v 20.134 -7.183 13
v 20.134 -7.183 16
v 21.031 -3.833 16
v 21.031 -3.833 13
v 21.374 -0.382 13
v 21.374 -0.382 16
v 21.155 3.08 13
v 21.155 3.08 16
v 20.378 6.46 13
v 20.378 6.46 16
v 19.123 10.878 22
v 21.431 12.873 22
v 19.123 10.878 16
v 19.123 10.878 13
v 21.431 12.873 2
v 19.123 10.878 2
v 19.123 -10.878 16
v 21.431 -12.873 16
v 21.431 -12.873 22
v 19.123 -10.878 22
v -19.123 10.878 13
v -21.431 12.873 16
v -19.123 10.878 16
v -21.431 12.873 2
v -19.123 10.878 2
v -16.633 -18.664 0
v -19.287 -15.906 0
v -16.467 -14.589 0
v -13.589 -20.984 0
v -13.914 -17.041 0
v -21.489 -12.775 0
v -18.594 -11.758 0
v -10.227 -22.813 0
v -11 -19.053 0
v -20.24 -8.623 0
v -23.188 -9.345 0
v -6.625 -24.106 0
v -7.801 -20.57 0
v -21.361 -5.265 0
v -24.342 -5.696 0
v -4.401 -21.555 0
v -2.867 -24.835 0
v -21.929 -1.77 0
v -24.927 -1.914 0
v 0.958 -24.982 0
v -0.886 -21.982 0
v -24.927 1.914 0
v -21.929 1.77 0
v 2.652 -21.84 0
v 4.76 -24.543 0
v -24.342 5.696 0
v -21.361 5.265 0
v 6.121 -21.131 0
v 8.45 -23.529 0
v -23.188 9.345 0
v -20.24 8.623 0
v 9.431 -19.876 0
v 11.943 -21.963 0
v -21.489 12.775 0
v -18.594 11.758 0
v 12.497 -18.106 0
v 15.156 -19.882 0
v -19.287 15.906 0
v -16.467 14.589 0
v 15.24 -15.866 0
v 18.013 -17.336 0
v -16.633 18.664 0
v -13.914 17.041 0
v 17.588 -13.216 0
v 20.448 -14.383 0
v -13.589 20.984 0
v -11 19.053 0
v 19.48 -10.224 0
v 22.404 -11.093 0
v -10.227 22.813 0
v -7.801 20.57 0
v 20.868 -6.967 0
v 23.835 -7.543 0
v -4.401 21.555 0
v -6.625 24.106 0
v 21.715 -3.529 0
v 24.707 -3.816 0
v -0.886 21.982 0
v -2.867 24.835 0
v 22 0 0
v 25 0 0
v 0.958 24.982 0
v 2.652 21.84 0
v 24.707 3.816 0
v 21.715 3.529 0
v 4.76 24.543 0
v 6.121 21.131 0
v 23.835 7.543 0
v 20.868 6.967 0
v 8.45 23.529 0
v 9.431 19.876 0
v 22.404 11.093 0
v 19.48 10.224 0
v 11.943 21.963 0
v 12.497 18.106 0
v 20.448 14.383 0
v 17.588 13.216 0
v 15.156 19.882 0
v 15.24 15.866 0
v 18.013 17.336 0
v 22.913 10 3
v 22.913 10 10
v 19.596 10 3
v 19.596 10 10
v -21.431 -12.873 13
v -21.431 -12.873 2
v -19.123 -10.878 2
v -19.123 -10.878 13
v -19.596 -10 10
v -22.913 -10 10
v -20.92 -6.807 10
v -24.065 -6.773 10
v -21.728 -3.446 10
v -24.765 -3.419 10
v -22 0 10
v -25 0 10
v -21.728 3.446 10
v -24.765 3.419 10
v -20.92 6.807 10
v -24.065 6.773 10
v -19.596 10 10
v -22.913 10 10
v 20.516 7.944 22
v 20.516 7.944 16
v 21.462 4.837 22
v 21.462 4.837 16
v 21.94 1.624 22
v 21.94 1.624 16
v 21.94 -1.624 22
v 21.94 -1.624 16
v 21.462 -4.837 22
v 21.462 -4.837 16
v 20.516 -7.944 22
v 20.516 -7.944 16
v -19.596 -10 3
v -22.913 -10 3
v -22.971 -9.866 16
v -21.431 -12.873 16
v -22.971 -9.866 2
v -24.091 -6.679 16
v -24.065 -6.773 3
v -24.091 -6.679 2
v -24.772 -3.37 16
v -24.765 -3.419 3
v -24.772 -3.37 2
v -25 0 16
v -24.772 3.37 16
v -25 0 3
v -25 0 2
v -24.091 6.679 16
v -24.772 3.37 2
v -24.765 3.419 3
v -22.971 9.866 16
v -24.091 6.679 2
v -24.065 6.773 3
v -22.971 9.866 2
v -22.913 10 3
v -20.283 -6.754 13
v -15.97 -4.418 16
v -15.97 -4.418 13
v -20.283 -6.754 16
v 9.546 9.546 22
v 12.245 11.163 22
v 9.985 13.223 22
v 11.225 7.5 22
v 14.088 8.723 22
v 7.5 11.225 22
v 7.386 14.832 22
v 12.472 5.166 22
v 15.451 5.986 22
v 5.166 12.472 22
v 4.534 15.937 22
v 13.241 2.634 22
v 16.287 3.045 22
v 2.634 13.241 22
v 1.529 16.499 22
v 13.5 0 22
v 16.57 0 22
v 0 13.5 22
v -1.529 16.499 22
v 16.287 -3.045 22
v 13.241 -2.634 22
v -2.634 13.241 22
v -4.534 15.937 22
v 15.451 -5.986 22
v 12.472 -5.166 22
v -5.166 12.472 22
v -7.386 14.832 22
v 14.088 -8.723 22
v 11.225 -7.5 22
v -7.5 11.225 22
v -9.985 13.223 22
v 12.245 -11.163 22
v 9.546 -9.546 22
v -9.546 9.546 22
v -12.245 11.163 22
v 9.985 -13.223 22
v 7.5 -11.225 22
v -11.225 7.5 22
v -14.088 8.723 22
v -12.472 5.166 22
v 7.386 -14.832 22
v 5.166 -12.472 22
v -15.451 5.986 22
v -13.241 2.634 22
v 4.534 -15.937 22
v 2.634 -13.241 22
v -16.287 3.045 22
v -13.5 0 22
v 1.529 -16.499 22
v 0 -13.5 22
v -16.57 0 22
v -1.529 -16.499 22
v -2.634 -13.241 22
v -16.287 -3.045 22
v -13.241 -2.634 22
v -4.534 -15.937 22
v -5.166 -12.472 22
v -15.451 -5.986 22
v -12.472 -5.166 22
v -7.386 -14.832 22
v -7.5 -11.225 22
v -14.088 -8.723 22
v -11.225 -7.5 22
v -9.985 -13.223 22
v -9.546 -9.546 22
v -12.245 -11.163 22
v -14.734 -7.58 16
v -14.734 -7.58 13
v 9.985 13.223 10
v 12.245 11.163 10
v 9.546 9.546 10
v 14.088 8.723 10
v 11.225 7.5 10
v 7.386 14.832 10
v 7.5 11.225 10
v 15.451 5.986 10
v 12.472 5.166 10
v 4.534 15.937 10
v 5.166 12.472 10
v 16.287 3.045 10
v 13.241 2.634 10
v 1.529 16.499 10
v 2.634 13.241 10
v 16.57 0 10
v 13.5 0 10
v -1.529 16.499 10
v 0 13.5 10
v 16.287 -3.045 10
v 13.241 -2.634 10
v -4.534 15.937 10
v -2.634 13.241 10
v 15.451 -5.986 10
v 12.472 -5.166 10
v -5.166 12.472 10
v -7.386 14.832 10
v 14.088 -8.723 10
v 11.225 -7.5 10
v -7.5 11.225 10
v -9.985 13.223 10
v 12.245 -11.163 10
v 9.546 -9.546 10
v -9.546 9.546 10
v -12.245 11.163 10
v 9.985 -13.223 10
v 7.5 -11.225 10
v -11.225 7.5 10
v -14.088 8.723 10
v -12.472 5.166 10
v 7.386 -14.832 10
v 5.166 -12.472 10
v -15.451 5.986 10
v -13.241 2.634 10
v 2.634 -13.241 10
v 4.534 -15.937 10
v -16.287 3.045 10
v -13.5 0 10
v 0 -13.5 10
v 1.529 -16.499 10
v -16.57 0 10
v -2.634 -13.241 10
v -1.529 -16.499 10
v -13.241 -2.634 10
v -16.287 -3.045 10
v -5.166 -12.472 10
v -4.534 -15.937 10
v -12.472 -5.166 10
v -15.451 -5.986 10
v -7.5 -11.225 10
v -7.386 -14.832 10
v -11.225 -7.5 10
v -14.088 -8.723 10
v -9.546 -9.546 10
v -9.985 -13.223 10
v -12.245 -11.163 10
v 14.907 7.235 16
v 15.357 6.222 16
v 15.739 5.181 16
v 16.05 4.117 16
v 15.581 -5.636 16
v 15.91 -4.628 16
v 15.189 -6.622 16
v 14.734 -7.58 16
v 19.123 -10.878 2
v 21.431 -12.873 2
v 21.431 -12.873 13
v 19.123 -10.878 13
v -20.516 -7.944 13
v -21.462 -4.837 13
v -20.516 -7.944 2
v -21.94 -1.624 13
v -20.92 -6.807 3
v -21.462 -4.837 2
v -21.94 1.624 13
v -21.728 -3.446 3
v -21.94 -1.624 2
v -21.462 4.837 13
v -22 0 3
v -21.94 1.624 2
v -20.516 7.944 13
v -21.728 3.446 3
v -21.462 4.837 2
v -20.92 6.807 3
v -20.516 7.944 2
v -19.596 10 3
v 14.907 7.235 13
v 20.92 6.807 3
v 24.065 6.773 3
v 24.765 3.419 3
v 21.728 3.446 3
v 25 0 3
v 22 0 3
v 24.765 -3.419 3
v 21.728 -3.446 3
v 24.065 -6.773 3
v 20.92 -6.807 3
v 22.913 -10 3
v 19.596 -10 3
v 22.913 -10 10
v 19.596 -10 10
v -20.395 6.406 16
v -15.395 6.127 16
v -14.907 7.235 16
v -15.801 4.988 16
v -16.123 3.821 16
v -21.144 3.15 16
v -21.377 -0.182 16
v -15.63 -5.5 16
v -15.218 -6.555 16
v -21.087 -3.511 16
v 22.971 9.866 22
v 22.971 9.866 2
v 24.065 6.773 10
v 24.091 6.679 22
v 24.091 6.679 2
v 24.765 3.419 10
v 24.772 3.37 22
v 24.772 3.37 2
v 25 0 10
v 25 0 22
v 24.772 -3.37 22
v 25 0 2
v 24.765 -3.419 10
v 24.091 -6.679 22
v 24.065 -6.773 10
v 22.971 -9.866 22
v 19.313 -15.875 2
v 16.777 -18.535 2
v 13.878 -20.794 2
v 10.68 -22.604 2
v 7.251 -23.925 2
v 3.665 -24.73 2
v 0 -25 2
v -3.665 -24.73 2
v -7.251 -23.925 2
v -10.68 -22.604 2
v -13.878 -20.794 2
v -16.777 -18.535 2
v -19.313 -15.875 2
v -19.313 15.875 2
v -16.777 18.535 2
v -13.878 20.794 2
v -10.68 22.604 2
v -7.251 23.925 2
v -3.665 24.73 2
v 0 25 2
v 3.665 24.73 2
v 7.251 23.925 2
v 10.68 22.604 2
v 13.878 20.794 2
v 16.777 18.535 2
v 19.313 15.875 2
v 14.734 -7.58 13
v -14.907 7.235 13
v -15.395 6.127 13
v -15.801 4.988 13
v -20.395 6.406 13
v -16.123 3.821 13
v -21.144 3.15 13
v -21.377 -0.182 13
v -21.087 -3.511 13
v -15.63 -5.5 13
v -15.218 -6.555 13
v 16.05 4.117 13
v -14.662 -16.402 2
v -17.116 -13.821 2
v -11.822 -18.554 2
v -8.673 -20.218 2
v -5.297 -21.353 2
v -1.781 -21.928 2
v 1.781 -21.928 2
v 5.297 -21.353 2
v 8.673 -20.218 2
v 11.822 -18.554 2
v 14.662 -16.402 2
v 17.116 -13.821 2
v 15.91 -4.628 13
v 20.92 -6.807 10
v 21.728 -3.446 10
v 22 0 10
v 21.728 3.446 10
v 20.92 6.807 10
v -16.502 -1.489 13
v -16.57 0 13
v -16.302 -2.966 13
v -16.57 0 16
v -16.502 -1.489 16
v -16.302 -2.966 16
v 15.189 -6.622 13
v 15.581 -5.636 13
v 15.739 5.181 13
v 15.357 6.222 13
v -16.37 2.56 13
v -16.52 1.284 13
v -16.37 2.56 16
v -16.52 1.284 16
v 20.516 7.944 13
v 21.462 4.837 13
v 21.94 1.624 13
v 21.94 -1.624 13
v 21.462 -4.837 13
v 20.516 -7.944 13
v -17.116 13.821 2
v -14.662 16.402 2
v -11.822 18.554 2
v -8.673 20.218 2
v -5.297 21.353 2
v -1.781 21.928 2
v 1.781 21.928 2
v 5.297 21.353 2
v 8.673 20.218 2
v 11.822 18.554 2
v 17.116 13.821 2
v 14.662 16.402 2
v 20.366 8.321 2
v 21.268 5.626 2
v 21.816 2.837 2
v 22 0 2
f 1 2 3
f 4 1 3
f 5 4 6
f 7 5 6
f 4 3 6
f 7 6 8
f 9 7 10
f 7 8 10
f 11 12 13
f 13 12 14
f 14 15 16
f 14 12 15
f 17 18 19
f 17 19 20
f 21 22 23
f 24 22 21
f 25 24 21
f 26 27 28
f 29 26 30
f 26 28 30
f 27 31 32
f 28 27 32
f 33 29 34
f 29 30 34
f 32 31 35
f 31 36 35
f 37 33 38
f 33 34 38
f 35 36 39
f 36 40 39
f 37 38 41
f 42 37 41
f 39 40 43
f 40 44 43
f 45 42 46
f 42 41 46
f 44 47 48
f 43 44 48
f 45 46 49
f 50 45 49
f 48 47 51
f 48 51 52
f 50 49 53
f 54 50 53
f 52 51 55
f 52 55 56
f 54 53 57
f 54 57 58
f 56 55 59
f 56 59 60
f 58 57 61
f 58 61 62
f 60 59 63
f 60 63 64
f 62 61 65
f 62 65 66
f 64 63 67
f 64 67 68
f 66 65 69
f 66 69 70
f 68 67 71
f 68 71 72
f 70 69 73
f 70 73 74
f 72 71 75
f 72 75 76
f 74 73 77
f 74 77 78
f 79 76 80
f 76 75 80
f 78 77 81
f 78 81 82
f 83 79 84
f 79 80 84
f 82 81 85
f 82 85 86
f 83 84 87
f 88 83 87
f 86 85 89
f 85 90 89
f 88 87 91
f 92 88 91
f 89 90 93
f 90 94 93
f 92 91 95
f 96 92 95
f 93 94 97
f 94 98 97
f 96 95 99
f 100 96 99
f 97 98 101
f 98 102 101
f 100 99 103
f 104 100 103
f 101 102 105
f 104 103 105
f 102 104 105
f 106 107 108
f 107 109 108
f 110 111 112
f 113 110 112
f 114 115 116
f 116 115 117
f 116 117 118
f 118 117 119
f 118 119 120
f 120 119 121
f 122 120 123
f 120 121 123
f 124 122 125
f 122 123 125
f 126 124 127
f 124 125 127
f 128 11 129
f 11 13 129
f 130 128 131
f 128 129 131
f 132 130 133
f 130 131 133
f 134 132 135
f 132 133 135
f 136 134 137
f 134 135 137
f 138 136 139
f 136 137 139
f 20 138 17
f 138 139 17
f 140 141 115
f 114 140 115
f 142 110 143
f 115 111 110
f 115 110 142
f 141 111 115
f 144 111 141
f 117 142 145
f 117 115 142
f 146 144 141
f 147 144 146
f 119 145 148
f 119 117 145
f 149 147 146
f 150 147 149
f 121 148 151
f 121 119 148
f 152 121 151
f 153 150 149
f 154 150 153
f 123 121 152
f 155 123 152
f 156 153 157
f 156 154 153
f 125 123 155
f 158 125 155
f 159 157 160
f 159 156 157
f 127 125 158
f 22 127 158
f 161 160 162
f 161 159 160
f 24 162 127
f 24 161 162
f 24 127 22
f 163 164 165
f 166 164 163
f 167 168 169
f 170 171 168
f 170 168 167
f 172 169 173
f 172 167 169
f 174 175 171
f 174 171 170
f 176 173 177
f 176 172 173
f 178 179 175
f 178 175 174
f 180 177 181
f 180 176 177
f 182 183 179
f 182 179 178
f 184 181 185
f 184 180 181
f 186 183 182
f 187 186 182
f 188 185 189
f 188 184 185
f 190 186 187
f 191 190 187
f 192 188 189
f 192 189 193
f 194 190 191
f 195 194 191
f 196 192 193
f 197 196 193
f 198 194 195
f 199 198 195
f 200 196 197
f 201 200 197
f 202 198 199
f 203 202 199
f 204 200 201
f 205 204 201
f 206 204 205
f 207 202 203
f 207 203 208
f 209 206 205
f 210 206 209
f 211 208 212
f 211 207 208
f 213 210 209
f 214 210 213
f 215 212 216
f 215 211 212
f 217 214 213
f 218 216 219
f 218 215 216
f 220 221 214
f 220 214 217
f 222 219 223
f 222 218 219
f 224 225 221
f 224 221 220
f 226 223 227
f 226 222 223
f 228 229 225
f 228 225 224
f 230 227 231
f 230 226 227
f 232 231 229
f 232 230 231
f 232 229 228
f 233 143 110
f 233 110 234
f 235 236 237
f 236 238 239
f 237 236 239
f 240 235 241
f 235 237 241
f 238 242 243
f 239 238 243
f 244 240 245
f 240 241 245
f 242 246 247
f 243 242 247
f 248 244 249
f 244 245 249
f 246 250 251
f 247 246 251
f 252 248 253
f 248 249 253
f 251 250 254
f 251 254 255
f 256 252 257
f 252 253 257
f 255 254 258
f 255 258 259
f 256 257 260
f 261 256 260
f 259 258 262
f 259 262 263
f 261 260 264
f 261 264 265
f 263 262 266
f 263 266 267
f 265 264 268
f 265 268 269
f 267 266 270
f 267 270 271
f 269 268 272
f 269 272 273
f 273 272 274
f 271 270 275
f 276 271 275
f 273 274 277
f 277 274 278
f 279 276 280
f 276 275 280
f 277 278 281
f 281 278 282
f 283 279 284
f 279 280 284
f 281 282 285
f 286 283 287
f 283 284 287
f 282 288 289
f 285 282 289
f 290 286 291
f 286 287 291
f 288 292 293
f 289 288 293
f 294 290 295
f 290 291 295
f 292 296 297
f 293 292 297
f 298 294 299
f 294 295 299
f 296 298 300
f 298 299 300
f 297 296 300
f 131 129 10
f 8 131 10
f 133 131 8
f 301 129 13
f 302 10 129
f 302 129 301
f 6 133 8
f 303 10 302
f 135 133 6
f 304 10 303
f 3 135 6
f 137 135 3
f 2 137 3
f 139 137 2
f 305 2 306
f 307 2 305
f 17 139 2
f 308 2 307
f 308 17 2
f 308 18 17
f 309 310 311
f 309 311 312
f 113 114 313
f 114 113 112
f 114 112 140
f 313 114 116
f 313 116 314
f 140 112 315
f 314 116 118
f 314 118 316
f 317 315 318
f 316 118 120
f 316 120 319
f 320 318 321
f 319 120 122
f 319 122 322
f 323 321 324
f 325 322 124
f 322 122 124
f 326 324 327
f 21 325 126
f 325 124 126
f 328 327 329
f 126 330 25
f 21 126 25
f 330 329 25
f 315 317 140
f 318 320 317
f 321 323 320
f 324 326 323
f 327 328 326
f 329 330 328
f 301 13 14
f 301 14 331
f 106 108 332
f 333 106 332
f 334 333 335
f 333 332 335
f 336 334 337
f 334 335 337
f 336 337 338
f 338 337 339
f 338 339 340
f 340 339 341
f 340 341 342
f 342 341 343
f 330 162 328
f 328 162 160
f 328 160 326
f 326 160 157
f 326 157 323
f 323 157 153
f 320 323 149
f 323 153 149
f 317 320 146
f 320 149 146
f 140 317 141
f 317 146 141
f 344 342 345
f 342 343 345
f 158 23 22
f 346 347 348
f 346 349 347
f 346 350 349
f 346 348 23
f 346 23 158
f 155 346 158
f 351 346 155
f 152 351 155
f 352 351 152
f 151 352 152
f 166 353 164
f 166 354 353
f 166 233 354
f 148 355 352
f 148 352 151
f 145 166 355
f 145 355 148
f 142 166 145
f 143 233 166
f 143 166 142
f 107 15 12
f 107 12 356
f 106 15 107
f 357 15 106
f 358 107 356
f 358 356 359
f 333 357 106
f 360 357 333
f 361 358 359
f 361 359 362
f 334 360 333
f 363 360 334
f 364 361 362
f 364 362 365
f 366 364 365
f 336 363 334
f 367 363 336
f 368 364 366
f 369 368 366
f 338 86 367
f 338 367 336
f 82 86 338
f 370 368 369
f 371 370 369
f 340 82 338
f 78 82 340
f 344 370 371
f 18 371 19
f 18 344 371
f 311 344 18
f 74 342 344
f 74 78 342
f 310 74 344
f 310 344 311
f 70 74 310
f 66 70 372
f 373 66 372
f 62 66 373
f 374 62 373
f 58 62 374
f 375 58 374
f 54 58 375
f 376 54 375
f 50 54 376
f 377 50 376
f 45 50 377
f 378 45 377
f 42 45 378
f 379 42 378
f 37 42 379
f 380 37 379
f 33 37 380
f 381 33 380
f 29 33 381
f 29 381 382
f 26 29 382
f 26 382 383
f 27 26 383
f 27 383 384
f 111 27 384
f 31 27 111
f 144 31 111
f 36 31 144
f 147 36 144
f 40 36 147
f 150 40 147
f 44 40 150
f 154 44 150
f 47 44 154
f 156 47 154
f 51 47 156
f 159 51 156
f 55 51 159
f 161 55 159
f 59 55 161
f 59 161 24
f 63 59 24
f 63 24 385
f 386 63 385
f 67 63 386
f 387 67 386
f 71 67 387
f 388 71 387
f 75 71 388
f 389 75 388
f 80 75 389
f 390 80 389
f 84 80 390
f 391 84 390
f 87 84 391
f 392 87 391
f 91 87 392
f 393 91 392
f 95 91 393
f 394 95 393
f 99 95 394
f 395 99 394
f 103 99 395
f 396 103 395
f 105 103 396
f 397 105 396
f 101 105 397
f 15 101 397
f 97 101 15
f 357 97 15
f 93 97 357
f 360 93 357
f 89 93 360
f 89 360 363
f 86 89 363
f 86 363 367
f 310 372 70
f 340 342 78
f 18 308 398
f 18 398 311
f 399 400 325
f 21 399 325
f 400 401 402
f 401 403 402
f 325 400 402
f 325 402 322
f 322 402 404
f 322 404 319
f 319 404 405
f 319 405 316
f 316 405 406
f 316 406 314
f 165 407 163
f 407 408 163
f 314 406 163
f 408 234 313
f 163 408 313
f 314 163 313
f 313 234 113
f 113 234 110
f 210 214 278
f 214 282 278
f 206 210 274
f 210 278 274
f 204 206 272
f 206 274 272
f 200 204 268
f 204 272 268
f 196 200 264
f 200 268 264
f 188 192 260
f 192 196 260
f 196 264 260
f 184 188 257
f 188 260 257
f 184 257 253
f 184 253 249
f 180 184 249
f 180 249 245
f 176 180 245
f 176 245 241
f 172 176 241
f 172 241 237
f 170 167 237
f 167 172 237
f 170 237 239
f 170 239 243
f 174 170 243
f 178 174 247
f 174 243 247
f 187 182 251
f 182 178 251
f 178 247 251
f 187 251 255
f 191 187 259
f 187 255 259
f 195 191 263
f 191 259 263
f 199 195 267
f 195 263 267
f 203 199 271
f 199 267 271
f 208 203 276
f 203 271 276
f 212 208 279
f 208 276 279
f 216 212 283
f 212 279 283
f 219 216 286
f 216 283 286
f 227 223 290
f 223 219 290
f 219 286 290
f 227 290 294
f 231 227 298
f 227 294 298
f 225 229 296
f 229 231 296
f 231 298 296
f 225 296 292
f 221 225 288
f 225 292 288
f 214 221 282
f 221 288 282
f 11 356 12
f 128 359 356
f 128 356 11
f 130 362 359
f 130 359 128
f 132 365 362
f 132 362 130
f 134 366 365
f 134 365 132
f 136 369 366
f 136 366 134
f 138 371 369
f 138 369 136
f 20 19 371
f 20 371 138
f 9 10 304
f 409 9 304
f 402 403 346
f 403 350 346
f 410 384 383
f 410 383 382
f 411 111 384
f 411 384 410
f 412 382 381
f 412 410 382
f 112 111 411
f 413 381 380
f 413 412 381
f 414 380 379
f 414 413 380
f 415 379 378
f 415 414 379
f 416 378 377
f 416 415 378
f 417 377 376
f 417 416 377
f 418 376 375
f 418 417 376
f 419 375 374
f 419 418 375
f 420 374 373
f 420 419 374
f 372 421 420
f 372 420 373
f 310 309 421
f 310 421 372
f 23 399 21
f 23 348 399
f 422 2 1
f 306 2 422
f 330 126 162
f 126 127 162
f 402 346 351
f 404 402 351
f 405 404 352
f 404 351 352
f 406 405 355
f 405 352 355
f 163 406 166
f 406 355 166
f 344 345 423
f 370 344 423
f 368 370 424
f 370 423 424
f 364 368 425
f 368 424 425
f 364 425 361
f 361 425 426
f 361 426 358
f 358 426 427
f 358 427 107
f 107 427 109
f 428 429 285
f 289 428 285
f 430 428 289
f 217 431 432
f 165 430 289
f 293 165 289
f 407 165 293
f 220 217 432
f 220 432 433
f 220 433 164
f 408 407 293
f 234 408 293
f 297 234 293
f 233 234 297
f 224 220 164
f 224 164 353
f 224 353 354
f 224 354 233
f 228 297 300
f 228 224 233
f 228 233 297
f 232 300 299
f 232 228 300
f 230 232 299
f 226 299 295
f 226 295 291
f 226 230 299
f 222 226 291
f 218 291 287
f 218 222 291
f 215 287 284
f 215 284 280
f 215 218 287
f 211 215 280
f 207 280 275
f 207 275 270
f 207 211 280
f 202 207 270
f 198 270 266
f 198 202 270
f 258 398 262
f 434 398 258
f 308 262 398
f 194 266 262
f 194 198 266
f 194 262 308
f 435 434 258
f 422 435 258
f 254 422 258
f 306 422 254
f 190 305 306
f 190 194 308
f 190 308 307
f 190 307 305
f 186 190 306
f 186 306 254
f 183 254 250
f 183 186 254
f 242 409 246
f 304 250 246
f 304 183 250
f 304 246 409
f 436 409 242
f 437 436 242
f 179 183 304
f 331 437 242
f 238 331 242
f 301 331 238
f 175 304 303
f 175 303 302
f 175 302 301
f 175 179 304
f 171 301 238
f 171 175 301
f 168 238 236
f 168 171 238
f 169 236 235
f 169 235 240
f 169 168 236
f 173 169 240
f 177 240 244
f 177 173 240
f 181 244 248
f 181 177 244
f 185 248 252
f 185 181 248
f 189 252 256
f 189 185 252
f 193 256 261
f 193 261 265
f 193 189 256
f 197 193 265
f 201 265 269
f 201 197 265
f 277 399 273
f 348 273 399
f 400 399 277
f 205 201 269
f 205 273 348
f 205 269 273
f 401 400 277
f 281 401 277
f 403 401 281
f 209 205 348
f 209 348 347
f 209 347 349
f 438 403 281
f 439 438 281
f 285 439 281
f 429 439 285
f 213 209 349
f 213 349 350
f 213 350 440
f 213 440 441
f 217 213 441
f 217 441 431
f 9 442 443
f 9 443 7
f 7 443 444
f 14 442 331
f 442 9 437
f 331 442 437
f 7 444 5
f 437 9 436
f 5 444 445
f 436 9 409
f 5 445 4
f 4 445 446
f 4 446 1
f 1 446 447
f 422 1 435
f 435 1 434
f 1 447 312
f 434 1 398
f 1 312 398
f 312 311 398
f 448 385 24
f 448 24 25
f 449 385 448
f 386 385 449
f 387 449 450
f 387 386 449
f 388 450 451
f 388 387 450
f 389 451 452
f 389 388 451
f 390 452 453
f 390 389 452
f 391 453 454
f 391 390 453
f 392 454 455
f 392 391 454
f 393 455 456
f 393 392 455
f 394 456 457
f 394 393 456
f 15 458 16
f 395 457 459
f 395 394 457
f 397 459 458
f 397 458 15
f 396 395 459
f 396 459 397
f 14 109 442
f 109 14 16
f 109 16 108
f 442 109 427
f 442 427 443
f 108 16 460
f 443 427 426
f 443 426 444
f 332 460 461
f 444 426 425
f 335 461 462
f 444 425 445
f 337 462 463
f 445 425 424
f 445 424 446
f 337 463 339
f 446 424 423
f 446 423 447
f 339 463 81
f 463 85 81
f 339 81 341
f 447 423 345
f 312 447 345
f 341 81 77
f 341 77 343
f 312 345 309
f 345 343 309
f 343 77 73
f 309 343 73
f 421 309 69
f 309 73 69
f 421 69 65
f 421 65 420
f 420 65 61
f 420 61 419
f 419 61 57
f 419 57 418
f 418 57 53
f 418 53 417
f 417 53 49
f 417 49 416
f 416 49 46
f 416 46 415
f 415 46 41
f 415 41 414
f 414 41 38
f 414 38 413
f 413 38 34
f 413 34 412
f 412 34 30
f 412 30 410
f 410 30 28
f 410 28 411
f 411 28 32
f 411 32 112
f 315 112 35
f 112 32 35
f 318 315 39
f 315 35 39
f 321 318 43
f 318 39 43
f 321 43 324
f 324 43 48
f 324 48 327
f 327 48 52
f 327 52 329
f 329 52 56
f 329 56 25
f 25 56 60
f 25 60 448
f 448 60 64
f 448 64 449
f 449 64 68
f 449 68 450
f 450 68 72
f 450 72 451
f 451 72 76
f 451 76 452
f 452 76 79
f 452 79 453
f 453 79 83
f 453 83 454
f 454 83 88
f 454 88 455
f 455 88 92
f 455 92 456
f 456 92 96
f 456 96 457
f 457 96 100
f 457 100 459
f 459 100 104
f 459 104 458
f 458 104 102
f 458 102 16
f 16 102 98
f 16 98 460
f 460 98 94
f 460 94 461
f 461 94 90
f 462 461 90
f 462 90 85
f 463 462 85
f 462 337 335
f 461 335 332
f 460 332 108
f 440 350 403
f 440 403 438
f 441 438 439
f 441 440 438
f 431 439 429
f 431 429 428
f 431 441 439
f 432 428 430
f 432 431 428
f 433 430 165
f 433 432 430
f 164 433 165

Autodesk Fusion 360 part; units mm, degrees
sketch "Sketch1" plane through (0, 0, 0) normal (0, 0, 1) x (1, 0, 0)
  circle A0 centre (0, 0) radius 22
  circle A1 centre (0, 0) radius 25
  dimension "d1" = 44
  dimension "d2" = 50
extrude "Extrude1" add sketch "Sketch1" along normal blind 2 makes body 1
sketch "Sketch2" plane through (0, 0, 2) normal (0, 0, 1) x (-1, 0, 0)
  circle A0 centre (0, 0) radius 22
  circle A1 centre (0, 0) radius 25
  circle A2 centre (0, 0) radius 22
  circle A3 centre (0, 0) radius 25
  line L0 (21.4312, -12.8726) -> (19.1226, -10.8777)
  line L1 (21.4312, 12.8726) -> (19.1226, 10.8777)
  line L2 (-21.4312, -12.8726) -> (-19.1226, -10.8777)
  line L3 (-21.4312, 12.8726) -> (-19.1226, 10.8777)
extrude "Extrude2" add sketch "Sketch2" along normal blind 15 contours A0 A1 A2 A3 L0 L1 | A0 A1 A2 A3 L2 L3 bodies 1
sketch "Sketch3" plane through (0, 0, 17) normal (0, 0, 1) x (-1, 0, 0)
  arc A0 (21.4312, -12.8726) -> (21.4312, 12.8726) centre (0, 0) ccw
  line L0 (21.4312, 12.8726) -> (19.1226, 10.8777)
  arc A1 (19.1226, -10.8777) -> (19.1226, 10.8777) centre (0, 0) ccw
  line L1 (19.1226, -10.8777) -> (21.4312, -12.8726)
  circle A2 centre (0, 0) radius 13.5
  circle A3 centre (0, 0) radius 16.5695
  dimension "d7" = 27
extrude "Extrude3" add sketch "Sketch3" along normal blind 5 separate body contours A3 makes body 2
extrude "Extrude4" add 2 faces at (-23.9039, -1.6648, 17) (23.9039, 1.6648, 17) along direction (0, 0, 1) blind 5 on bodies 1 bodies 1
extrude "Extrude5" add 1 faces at (-15.4344, 1.4939, 17) along direction (0, 0, -1) blind 7 on bodies 2 bodies 2
extrude "Extrude6" cut 2 faces at (-23.9039, -1.6648, 22) (-23.9039, -1.6648, 22) along direction (0, 0, -1) blind 6 on bodies 1 bodies 1
sketch "Sketch4" plane through (0, 0, 16) normal (0, 0, 1) x (-1, 0, 0)
  arc A0 (21.4312, -12.8726) -> (21.4312, 12.8726) centre (0, 0) ccw
  line L0 (21.4312, 12.8726) -> (19.1226, 10.8777)
  arc A1 (19.1226, -10.8777) -> (19.1226, 10.8777) centre (0, 0) ccw
  line L1 (19.1226, -10.8777) -> (21.4312, -12.8726)
  line L2 (21.4312, 12.8726) -> (14, 7)
  line L3 (14, 7) -> (14, -6.4511)
  line L4 (14, -6.4511) -> (21.4312, -12.8726)
extrude "Extrude7" add sketch "Sketch4" against normal blind 3 contours L0 A1 L2 L3 L4 bodies 1 2
mirror "Mirror1" about plane through (0, 0, 0) normal (1, 0, 0) of "Extrude7"
sketch "Sketch5" plane through (0, 0, 0) normal (1, 0, 0) x (0, 1, 0)
  line L0 (-10, 10) -> (10, 10)
  line L1 (10, 10) -> (10, 3)
  line L2 (10, 3) -> (-10, 3)
  line L3 (-10, 3) -> (-10, 10)
extrude "Extrude8" cut sketch "Sketch5" along normal mid plane 54 bodies 1
sketch "Sketch6" plane through (0, 0, 16) normal (0, 0, 1) x (-1, 0, 0)
  arc A0 (21.4312, -12.8726) -> (21.4312, 12.8726) centre (0, 0) ccw
  line L0 (21.4312, 12.8726) -> (14.734, 7.5801)
  arc A1 (14.9067, -7.2346) -> (14.734, 7.5801) centre (0, 0) ccw
  line L1 (14.9067, -7.2346) -> (21.4312, -12.8726)
  circle A2 centre (0, 0) radius 16.5695
  circle A3 centre (0, 0) radius 21.3776
  line L2 (-20.1345, 7.1834) -> (-15.9102, 4.6275)
  line L3 (-20.3781, -6.4601) -> (-16.05, -4.1167)
  line L4 (15.9696, 4.4183) -> (20.2828, 6.7535)
  line L5 (16.1229, -3.8213) -> (20.3951, -6.4063)
extrude "Extrude9" cut sketch "Sketch6" against normal blind 8 contours A2 A3 L2 L3 | A1 A2 A3 L4 L5 bodies 1
